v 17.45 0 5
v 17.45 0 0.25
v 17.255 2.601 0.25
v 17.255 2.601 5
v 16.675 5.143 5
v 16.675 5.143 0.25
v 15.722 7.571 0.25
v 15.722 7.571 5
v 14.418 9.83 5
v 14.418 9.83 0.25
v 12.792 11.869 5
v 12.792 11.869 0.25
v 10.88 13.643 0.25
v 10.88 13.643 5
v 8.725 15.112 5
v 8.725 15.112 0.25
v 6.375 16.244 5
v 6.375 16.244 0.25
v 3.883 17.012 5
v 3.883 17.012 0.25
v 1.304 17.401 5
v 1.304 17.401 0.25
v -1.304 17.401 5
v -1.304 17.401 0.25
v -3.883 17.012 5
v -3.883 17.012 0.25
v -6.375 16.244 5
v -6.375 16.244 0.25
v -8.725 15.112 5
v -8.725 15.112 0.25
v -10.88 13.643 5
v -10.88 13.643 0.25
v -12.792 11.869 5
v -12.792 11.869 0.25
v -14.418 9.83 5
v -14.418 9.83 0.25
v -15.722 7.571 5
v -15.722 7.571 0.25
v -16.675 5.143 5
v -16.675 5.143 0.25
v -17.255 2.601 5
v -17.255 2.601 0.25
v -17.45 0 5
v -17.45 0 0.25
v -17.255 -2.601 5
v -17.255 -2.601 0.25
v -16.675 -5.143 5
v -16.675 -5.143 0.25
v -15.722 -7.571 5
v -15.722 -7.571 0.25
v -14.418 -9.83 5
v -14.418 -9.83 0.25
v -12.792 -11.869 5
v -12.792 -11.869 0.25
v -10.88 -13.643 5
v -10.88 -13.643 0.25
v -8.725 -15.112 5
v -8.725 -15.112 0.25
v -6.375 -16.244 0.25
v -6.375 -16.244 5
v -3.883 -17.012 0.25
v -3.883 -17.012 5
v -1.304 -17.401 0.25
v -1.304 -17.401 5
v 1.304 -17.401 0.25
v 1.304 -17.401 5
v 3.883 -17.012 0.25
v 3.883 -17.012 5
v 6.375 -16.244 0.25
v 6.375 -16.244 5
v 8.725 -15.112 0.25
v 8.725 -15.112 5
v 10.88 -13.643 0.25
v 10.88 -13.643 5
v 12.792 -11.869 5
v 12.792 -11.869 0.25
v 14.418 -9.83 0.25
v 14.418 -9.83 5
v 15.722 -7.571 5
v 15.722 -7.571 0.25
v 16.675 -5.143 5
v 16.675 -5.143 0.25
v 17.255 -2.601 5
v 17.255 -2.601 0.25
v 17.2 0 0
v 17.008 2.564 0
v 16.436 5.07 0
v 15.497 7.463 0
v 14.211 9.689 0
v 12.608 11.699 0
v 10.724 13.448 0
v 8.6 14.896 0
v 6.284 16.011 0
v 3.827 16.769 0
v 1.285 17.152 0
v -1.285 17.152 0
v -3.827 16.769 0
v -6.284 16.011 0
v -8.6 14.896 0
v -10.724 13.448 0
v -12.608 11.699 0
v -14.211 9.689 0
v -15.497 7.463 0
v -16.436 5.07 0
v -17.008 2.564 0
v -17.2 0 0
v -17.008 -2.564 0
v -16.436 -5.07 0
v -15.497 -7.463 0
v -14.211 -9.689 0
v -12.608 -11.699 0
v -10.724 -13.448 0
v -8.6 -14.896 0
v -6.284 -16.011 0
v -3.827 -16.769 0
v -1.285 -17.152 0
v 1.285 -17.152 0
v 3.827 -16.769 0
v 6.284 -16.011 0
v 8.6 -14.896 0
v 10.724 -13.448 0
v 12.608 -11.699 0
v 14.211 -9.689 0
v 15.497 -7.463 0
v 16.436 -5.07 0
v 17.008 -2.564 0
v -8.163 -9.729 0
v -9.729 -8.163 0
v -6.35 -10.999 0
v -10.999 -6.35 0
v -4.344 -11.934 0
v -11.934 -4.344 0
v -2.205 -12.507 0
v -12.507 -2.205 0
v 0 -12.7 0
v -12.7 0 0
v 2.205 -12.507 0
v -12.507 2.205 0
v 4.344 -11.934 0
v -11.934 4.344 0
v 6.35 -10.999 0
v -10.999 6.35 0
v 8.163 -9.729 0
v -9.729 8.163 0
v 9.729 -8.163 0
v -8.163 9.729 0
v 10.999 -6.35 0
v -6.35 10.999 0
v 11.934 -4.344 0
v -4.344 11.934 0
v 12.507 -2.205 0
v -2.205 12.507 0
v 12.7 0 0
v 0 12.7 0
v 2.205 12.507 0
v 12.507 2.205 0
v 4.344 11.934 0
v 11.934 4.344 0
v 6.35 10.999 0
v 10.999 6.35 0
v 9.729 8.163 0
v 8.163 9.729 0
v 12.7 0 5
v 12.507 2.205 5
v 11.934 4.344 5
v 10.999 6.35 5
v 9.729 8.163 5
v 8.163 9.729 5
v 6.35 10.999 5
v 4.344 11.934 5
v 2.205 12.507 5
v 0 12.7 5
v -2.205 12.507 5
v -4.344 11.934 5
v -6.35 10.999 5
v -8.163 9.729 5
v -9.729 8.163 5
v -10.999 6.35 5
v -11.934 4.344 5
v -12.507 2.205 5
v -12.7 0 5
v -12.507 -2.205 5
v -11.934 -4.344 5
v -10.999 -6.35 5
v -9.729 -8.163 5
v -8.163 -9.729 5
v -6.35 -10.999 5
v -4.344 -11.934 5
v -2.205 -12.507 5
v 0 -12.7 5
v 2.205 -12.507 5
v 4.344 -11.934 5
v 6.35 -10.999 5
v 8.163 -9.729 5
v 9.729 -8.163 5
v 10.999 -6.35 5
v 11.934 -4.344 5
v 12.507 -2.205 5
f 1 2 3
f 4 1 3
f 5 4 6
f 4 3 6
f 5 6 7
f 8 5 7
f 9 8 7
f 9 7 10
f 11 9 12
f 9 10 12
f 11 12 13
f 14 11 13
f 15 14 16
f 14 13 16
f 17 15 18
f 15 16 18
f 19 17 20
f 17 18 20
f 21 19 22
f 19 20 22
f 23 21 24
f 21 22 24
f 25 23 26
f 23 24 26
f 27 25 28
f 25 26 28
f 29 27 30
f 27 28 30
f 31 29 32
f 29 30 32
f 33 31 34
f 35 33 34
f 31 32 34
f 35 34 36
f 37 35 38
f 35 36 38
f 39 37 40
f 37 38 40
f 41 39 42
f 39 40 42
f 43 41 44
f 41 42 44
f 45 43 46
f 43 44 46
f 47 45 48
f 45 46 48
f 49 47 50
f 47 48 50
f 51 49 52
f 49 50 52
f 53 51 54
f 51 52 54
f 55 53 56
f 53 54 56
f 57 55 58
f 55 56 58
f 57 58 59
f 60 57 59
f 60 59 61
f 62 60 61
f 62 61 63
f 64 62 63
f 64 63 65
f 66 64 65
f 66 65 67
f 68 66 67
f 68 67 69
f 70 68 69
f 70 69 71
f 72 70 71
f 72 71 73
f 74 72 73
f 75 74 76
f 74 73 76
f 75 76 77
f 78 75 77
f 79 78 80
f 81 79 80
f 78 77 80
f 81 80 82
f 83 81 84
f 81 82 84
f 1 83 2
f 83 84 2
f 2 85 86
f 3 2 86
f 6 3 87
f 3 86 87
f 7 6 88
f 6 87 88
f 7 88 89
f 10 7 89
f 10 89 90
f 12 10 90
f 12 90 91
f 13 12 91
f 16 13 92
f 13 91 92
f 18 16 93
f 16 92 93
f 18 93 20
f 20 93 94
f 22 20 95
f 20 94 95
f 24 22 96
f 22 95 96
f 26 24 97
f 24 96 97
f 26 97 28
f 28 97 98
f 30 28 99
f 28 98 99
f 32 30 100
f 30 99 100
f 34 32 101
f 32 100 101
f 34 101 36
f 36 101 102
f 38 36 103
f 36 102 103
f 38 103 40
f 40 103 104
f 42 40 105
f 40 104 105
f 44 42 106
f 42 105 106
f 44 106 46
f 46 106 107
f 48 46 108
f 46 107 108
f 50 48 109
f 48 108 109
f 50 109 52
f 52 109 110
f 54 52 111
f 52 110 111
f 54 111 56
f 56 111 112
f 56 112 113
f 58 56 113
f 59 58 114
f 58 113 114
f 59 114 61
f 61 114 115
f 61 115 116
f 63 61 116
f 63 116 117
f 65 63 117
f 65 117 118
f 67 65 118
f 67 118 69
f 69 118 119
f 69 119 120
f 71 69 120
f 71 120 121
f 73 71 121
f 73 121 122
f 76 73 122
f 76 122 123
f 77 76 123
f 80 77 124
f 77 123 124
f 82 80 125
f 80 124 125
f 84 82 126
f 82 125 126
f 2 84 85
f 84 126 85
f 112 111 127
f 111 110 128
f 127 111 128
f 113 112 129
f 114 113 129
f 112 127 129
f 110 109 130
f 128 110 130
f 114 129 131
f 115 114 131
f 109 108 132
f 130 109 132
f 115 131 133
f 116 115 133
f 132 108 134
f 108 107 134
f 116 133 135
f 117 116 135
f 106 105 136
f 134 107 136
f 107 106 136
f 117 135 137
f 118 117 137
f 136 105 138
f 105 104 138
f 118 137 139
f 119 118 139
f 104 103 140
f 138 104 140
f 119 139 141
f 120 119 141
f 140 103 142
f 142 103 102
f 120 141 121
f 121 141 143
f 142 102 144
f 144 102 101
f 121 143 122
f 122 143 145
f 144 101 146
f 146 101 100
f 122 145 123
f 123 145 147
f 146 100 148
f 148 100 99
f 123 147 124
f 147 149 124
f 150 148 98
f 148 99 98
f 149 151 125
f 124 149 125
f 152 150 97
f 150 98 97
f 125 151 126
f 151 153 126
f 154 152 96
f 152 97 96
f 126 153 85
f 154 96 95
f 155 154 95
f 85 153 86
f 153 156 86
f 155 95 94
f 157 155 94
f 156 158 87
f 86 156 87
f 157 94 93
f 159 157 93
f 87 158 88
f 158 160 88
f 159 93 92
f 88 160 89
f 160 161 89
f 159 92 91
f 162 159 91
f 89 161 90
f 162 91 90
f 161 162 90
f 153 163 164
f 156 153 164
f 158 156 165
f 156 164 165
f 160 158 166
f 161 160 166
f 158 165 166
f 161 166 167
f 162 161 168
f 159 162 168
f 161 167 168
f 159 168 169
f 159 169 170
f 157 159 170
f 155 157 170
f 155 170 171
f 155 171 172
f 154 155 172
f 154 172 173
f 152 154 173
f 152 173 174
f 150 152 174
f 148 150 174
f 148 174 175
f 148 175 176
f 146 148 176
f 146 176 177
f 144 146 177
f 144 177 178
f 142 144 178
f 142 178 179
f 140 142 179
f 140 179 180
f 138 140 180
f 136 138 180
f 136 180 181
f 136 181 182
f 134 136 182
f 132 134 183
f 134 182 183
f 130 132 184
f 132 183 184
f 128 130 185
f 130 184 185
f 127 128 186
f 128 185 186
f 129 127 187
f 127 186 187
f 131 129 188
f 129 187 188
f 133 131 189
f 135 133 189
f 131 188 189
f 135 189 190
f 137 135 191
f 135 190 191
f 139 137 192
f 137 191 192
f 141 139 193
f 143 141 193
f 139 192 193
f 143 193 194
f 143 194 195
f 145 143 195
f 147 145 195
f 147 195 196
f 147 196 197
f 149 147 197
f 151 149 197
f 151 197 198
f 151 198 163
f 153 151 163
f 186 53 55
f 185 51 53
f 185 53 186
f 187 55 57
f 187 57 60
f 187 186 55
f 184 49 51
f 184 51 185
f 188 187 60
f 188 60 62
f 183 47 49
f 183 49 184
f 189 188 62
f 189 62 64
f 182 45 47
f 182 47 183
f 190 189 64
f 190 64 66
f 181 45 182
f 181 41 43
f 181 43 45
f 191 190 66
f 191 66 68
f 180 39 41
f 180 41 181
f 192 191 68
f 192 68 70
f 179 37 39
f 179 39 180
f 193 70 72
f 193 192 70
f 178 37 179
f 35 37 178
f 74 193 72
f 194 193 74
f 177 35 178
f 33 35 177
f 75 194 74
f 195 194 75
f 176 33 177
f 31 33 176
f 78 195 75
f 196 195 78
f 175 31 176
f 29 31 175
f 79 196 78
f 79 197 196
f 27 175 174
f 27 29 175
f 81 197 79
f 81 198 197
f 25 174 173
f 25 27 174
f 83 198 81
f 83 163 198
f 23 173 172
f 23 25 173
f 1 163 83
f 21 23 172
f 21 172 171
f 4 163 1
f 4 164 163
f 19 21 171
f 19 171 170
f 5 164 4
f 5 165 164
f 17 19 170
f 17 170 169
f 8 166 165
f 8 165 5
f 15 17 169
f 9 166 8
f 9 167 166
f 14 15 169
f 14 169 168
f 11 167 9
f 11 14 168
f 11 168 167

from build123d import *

# Parameters (mm, degrees)
SKETCH1_R           = 17.45
BOSS_EXTRUDE1_DEPTH = 5
SKETCH2_R           = 12.65
BOSS_EXTRUDE2_DEPTH = 6.3
SKETCH3_R           = 12.7
CUT_EXTRUDE1_DEPTH  = 28.14212593
CHAMFER3_SIZE       = 0.25


with BuildPart() as part:
    # Sketch1 → Boss-Extrude1 (new body)
    with BuildSketch(Plane.XY):
        Circle(SKETCH1_R)
    extrude(amount=BOSS_EXTRUDE1_DEPTH)

    # Sketch2 → Boss-Extrude2 (add)
    with BuildSketch(Plane(origin=(0, 0, 0), x_dir=(-1, 0, 0), z_dir=(0, 0, -1))):
        with Locations(Location((0, 0, 0), (0, 0, 180))):
            Circle(SKETCH2_R)
    extrude(amount=BOSS_EXTRUDE2_DEPTH)

    # Sketch3 → Cut-Extrude1 (cut, through all)
    with BuildSketch(Plane.XY.offset(5)):
        Circle(SKETCH3_R)
    extrude(amount=-CUT_EXTRUDE1_DEPTH, mode=Mode.SUBTRACT)

    # Chamfer3
    chamfer3_edges = [part.edges().sort_by_distance(p)[0] for p in [
        (-17.45, 0, 0),
    ]]
    chamfer(chamfer3_edges, length=CHAMFER3_SIZE)


solid = part.part
